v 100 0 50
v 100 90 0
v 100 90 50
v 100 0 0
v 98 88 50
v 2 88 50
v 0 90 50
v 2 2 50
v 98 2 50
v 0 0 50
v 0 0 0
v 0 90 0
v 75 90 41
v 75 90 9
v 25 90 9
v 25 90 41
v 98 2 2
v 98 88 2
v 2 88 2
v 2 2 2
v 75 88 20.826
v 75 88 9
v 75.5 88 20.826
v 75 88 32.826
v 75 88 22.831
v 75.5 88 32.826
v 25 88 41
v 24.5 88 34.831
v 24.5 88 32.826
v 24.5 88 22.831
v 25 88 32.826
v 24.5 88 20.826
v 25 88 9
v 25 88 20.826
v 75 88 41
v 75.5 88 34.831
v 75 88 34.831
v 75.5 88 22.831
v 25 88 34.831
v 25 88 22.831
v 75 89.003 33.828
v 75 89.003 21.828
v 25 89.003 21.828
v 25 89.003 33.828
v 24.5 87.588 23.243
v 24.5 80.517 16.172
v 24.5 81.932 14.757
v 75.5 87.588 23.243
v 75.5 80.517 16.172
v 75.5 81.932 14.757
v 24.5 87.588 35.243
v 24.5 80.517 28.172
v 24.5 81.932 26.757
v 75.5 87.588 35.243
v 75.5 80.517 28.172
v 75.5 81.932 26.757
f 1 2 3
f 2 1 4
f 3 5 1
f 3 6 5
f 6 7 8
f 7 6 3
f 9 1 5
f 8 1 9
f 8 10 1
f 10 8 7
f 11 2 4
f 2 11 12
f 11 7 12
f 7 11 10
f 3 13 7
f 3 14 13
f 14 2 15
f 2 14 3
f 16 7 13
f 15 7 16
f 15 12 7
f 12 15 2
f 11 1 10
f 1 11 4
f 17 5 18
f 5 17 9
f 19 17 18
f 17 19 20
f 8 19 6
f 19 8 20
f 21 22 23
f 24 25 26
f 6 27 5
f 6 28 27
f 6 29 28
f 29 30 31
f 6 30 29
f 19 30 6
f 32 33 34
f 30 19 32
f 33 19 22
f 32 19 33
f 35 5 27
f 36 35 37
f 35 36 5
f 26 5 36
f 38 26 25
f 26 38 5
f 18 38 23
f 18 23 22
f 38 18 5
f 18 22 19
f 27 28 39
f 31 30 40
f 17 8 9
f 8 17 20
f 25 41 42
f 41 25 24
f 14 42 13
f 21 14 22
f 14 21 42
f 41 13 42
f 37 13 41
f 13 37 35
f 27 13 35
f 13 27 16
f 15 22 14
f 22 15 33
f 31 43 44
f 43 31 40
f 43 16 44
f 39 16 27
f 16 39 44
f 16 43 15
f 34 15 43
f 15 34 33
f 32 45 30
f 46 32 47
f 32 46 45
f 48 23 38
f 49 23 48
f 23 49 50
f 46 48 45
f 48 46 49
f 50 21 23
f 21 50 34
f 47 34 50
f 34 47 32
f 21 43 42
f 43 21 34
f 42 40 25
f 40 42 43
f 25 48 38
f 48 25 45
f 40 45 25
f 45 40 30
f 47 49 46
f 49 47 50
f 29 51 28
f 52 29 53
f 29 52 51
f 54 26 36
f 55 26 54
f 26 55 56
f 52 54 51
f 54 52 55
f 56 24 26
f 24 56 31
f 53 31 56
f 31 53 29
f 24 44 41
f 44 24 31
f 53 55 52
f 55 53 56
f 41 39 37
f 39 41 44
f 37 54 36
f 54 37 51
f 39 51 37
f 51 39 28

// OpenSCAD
$fn = 32;

// ----------------------------------------------------------------------
// Vent box: louvers enclosure
// ----------------------------------------------------------------------

// --- parameters (mm) ---
box_l = 100;              // box length, X
box_w = 90;               // box width, Y
box_h = 50;               // box height, Z
wall_t = 2;               // shell wall thickness
win_l = 50;               // vent window width, X
win_h = 32;               // vent window height, Z
slat_t = 2;               // louver slat thickness
slat_d = 10;              // louver slat depth
slat_a = 45;              // louver slat angle, degrees
slat_pitch = 12;          // louver pitch
slat_yc = 84.76;          // slat centreline Y

win_z0 = (box_h - win_h) / 2;  // window lower edge Z
n_slats = 2;  // louver count
slat_z0 = win_z0 + (win_h - (n_slats - 1) * slat_pitch) / 2;

difference() {
  union() {
    difference() {
      cube([box_l, box_w, box_h]);
  translate([wall_t, wall_t, wall_t])
    cube([box_l - 2 * wall_t, box_w - 2 * wall_t, box_h]);
  translate([(box_l - win_l) / 2, box_w - wall_t - 1, win_z0])
    cube([win_l, wall_t + 2, win_h]);
    }
    for (i = [0 : n_slats - 1])
      translate([box_l / 2, slat_yc, slat_z0 + i * slat_pitch])
        rotate([slat_a, 0, 0])
          cube([win_l + 1, slat_d, slat_t], center = true);
  }
}
